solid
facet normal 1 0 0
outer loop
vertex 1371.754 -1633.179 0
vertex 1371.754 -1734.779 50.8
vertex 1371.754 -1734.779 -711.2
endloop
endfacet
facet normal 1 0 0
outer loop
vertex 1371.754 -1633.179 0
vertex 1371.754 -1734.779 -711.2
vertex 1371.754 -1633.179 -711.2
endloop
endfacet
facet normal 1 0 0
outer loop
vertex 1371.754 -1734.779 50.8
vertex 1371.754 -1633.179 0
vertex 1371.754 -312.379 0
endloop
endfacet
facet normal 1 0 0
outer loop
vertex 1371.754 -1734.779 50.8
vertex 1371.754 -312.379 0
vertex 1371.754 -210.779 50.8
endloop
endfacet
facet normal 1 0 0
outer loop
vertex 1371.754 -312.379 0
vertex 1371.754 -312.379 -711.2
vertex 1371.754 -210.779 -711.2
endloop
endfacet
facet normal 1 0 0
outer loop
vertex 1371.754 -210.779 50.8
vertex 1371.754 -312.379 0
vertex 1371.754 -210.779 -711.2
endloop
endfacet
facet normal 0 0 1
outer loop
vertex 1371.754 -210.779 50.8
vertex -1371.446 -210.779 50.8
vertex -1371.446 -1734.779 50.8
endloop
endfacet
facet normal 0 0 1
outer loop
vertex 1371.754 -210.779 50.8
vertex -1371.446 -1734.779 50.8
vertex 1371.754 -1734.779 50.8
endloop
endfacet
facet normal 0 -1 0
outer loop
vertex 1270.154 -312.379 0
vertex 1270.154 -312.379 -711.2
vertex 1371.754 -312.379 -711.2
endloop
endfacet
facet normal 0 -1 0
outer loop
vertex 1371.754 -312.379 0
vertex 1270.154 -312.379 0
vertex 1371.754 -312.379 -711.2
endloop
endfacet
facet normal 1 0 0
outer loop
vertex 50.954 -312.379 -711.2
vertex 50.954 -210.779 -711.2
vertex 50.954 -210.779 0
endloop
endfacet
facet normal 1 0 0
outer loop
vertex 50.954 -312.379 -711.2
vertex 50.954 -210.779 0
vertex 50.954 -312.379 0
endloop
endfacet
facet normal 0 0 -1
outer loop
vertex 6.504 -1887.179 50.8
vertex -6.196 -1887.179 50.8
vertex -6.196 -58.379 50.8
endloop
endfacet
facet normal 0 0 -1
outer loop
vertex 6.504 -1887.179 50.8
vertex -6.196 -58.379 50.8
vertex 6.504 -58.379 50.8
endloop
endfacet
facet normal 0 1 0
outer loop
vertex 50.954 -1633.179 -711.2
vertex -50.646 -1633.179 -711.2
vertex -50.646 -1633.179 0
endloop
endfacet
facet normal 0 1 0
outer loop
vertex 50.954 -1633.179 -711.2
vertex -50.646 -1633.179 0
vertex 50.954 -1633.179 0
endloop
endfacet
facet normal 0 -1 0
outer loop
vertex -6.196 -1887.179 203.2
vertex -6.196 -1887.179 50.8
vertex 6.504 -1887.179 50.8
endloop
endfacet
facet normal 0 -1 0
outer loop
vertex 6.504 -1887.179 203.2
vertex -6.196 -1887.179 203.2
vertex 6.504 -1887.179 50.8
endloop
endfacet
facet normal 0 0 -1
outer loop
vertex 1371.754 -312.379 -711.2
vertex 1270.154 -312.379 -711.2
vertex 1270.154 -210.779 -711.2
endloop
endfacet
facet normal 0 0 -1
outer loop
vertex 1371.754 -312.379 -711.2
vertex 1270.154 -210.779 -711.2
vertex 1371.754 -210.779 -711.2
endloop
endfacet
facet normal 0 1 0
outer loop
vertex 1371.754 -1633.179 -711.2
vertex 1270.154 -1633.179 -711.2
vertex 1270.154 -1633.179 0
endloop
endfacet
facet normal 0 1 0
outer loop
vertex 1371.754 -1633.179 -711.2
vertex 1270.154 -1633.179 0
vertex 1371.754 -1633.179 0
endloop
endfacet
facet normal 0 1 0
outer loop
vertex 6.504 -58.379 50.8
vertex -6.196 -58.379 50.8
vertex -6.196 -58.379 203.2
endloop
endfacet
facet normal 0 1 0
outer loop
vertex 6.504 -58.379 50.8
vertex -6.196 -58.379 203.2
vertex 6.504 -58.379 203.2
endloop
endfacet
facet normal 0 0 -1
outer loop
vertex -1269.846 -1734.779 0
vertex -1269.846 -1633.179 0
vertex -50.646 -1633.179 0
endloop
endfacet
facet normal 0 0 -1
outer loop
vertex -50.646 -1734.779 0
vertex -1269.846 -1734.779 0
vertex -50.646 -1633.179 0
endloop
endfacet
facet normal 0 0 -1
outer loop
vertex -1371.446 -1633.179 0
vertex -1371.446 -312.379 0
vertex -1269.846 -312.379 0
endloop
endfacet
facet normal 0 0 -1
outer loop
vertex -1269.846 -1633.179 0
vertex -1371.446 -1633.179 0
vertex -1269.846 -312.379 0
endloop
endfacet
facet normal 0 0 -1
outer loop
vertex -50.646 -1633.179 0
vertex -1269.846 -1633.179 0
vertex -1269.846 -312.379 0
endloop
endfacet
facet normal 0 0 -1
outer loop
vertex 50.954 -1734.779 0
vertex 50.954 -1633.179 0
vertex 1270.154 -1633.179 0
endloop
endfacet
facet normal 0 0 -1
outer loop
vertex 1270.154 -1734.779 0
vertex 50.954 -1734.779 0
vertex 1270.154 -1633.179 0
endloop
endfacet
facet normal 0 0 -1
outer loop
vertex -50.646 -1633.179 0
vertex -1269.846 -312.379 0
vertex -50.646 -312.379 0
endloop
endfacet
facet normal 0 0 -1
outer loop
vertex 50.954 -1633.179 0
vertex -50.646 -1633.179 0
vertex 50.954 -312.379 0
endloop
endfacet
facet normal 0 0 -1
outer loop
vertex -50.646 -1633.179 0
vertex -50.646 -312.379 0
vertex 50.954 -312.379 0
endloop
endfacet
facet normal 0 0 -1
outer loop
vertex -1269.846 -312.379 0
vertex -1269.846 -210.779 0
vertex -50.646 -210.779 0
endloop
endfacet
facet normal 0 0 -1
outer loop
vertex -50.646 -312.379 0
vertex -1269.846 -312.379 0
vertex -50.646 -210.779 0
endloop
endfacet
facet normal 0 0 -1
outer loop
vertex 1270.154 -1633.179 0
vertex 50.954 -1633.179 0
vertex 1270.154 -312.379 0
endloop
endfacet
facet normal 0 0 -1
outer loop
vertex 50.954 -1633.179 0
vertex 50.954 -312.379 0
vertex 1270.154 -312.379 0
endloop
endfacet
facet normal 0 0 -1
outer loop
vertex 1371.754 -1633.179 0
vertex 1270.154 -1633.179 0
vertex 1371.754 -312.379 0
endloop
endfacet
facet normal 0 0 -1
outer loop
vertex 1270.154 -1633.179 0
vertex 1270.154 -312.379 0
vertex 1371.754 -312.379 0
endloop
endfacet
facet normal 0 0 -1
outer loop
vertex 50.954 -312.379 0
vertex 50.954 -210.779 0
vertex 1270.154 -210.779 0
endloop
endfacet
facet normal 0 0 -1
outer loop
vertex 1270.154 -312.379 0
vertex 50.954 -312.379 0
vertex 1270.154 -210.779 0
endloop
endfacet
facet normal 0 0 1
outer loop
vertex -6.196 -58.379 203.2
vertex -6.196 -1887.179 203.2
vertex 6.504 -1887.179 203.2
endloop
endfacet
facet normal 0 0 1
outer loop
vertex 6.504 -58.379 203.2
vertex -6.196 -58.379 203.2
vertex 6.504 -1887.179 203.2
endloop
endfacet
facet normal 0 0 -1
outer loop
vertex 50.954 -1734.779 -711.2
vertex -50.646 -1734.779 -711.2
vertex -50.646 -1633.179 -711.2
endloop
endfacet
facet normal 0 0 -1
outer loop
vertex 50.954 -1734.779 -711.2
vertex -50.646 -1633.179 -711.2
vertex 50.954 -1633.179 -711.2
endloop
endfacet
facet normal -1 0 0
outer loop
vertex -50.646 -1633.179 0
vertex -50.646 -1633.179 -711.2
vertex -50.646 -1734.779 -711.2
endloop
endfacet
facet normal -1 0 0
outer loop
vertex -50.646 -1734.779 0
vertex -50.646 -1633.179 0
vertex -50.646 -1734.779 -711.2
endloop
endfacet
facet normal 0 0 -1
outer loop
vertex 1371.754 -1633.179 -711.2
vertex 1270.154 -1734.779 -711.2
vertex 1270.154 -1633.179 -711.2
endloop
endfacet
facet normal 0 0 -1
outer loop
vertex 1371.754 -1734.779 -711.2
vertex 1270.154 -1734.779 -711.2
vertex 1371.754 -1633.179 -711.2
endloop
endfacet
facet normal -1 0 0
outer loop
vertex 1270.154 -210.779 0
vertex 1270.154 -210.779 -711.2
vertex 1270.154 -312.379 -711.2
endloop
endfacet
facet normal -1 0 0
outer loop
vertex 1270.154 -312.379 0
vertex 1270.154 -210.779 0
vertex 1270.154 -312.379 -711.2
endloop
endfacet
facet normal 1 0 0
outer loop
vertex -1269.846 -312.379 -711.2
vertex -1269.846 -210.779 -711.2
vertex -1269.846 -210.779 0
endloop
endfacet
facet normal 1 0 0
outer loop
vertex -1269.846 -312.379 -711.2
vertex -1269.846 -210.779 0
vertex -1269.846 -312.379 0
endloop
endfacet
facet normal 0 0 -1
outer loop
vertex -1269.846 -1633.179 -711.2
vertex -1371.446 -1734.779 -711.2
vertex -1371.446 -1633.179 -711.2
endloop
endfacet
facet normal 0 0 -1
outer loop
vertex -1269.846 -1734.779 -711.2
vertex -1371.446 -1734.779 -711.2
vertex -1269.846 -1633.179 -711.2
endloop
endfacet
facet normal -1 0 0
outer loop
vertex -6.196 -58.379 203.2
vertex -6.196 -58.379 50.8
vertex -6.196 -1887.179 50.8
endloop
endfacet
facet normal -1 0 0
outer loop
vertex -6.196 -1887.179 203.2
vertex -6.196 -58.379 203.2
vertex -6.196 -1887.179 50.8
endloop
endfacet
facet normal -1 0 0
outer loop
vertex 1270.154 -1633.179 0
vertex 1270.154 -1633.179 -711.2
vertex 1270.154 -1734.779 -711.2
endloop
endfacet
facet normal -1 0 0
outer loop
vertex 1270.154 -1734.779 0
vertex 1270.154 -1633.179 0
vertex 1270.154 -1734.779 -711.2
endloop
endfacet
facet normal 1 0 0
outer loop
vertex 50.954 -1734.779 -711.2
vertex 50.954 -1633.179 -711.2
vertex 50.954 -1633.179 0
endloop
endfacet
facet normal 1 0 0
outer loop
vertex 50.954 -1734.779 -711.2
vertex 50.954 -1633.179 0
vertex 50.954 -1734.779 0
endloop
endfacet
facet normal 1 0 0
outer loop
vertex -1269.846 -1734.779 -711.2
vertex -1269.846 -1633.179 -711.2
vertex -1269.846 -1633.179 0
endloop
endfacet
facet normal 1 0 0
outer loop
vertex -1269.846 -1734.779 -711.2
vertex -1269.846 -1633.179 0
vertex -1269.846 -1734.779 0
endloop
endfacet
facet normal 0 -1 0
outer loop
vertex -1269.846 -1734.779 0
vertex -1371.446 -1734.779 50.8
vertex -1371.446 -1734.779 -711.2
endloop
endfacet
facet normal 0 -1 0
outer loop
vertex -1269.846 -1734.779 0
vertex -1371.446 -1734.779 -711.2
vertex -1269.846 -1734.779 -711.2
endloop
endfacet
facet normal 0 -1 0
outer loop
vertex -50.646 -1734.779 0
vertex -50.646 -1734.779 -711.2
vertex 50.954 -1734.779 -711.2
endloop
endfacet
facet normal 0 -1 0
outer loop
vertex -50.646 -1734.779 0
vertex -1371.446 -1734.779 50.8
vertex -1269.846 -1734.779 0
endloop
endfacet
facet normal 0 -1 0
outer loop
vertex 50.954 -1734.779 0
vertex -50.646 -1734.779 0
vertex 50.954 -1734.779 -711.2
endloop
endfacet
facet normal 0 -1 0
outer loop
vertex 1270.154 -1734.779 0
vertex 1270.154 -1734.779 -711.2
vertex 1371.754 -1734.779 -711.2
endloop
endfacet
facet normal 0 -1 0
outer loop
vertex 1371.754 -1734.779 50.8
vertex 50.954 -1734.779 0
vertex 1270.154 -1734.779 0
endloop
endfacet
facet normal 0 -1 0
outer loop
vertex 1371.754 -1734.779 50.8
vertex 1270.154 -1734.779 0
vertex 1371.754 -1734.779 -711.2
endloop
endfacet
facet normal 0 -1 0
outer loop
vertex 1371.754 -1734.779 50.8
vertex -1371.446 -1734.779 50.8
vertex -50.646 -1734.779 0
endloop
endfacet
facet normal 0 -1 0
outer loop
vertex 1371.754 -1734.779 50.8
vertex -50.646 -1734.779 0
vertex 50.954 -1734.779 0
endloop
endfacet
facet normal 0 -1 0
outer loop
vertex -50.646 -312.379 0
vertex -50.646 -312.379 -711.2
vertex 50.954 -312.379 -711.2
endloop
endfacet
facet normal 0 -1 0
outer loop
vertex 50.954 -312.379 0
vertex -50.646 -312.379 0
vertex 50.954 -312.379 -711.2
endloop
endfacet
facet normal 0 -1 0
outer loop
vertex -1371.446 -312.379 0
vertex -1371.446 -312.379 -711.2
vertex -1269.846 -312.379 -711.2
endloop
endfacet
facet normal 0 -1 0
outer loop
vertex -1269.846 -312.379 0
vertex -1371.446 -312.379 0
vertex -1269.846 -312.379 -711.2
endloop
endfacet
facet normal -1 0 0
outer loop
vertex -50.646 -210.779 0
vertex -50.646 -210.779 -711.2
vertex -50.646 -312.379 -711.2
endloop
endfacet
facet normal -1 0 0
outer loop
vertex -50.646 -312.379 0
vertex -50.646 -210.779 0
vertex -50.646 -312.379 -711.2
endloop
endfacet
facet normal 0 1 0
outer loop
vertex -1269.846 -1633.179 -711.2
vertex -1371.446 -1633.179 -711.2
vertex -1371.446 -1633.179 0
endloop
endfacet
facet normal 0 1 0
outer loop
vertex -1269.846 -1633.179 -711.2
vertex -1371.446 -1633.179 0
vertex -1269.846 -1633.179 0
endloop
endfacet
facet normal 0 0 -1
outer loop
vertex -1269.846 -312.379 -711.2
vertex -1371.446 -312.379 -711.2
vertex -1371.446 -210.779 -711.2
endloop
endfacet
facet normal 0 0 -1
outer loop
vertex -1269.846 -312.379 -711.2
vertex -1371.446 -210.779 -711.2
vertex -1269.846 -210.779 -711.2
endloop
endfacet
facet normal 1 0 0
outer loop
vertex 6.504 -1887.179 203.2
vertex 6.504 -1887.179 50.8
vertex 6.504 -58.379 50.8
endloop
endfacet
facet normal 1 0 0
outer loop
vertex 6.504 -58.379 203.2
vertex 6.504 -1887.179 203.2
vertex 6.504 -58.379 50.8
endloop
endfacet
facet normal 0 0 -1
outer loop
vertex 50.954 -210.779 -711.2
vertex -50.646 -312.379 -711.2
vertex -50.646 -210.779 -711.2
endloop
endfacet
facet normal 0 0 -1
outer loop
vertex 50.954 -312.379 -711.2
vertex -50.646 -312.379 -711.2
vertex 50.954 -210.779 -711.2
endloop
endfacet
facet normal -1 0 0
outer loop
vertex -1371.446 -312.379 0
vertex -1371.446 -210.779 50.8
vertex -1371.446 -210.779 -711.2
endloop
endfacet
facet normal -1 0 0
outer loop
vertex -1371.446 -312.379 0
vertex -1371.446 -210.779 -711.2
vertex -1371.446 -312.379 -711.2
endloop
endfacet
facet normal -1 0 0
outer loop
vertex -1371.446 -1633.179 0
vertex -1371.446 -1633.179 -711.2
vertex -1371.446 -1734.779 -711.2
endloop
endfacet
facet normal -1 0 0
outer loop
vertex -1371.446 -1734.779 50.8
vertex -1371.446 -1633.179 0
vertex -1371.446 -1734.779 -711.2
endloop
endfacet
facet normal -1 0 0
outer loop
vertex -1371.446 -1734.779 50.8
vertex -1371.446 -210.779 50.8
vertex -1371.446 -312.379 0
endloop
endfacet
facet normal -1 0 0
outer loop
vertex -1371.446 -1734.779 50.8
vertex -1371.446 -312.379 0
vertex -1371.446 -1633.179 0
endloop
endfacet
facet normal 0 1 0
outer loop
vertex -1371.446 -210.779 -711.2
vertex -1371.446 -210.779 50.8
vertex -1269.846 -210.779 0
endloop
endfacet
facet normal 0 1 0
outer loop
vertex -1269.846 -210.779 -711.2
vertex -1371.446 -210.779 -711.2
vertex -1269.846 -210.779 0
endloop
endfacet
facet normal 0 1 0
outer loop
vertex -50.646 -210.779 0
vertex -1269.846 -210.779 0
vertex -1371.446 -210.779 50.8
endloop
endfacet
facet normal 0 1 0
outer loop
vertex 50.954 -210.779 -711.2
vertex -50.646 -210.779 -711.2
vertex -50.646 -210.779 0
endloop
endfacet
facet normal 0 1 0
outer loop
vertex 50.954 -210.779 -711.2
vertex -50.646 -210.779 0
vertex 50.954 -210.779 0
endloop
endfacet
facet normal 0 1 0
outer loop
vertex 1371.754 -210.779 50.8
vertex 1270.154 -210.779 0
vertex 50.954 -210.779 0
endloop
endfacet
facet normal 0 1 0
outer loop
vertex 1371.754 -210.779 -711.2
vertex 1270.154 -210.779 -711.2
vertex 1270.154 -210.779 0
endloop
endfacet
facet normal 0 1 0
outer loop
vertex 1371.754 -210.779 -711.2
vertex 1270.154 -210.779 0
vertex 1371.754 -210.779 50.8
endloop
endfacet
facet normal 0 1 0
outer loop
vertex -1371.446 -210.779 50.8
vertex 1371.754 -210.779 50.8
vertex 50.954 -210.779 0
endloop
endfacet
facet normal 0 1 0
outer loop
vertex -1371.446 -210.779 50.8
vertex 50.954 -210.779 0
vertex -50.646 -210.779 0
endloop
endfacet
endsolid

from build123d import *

# Parameters (mm, degrees)
F0_W     = 2743.2
F0_H     = 1524
F1_DEPTH = 50.8
F2_W     = 12.7
F2_H     = 1524
F2_H_2   = 152.4
F3_DEPTH = 152.4
F4_W     = 101.6
F4_H     = 101.6
F5_DEPTH = 711.2


with BuildPart() as f1:
    # F0 (on Top) → F1 (new body)
    with BuildSketch(Plane.XY):
        with Locations((0.1544617116, -972.7794401628)):
            Rectangle(F0_W, F0_H)
    extrude(amount=F1_DEPTH)

    # F4 (on face) → F5 (join)
    with BuildSketch(Plane(origin=(0, 0, 0), x_dir=(1, 0, 0), z_dir=(0, 0, -1))):
        with Locations((-1320.6455382884, 1683.9794401628)):
            Rectangle(F4_W, F4_H)
        with Locations((0.1544617116, 1683.9794401628)):
            Rectangle(F4_W, F4_H)
        with Locations((1320.9544617116, 1683.9794401628)):
            Rectangle(F4_W, F4_H)
        with Locations((1320.9544617116, 261.5794401628)):
            Rectangle(F4_W, F4_H)
        with Locations((0.1544617116, 261.5794401628)):
            Rectangle(F4_W, F4_H)
        with Locations((-1320.6455382884, 261.5794401628)):
            Rectangle(F4_W, F4_H)
    extrude(amount=F5_DEPTH)


with BuildPart() as f3:
    # F2 (on face) → F3 (new body)
    with BuildSketch(Plane.XY.offset(50.8)):
        with Locations((0.1544617116, -972.7794401628)):
            Rectangle(F2_W, F2_H)
        with Locations((0.1544617116, -1810.9794401628)):
            Rectangle(F2_W, F2_H_2)
        with Locations((0.1544617116, -134.5794401628)):
            Rectangle(F2_W, F2_H_2)
    extrude(amount=F3_DEPTH)


solid = Compound([f1.part, f3.part])
